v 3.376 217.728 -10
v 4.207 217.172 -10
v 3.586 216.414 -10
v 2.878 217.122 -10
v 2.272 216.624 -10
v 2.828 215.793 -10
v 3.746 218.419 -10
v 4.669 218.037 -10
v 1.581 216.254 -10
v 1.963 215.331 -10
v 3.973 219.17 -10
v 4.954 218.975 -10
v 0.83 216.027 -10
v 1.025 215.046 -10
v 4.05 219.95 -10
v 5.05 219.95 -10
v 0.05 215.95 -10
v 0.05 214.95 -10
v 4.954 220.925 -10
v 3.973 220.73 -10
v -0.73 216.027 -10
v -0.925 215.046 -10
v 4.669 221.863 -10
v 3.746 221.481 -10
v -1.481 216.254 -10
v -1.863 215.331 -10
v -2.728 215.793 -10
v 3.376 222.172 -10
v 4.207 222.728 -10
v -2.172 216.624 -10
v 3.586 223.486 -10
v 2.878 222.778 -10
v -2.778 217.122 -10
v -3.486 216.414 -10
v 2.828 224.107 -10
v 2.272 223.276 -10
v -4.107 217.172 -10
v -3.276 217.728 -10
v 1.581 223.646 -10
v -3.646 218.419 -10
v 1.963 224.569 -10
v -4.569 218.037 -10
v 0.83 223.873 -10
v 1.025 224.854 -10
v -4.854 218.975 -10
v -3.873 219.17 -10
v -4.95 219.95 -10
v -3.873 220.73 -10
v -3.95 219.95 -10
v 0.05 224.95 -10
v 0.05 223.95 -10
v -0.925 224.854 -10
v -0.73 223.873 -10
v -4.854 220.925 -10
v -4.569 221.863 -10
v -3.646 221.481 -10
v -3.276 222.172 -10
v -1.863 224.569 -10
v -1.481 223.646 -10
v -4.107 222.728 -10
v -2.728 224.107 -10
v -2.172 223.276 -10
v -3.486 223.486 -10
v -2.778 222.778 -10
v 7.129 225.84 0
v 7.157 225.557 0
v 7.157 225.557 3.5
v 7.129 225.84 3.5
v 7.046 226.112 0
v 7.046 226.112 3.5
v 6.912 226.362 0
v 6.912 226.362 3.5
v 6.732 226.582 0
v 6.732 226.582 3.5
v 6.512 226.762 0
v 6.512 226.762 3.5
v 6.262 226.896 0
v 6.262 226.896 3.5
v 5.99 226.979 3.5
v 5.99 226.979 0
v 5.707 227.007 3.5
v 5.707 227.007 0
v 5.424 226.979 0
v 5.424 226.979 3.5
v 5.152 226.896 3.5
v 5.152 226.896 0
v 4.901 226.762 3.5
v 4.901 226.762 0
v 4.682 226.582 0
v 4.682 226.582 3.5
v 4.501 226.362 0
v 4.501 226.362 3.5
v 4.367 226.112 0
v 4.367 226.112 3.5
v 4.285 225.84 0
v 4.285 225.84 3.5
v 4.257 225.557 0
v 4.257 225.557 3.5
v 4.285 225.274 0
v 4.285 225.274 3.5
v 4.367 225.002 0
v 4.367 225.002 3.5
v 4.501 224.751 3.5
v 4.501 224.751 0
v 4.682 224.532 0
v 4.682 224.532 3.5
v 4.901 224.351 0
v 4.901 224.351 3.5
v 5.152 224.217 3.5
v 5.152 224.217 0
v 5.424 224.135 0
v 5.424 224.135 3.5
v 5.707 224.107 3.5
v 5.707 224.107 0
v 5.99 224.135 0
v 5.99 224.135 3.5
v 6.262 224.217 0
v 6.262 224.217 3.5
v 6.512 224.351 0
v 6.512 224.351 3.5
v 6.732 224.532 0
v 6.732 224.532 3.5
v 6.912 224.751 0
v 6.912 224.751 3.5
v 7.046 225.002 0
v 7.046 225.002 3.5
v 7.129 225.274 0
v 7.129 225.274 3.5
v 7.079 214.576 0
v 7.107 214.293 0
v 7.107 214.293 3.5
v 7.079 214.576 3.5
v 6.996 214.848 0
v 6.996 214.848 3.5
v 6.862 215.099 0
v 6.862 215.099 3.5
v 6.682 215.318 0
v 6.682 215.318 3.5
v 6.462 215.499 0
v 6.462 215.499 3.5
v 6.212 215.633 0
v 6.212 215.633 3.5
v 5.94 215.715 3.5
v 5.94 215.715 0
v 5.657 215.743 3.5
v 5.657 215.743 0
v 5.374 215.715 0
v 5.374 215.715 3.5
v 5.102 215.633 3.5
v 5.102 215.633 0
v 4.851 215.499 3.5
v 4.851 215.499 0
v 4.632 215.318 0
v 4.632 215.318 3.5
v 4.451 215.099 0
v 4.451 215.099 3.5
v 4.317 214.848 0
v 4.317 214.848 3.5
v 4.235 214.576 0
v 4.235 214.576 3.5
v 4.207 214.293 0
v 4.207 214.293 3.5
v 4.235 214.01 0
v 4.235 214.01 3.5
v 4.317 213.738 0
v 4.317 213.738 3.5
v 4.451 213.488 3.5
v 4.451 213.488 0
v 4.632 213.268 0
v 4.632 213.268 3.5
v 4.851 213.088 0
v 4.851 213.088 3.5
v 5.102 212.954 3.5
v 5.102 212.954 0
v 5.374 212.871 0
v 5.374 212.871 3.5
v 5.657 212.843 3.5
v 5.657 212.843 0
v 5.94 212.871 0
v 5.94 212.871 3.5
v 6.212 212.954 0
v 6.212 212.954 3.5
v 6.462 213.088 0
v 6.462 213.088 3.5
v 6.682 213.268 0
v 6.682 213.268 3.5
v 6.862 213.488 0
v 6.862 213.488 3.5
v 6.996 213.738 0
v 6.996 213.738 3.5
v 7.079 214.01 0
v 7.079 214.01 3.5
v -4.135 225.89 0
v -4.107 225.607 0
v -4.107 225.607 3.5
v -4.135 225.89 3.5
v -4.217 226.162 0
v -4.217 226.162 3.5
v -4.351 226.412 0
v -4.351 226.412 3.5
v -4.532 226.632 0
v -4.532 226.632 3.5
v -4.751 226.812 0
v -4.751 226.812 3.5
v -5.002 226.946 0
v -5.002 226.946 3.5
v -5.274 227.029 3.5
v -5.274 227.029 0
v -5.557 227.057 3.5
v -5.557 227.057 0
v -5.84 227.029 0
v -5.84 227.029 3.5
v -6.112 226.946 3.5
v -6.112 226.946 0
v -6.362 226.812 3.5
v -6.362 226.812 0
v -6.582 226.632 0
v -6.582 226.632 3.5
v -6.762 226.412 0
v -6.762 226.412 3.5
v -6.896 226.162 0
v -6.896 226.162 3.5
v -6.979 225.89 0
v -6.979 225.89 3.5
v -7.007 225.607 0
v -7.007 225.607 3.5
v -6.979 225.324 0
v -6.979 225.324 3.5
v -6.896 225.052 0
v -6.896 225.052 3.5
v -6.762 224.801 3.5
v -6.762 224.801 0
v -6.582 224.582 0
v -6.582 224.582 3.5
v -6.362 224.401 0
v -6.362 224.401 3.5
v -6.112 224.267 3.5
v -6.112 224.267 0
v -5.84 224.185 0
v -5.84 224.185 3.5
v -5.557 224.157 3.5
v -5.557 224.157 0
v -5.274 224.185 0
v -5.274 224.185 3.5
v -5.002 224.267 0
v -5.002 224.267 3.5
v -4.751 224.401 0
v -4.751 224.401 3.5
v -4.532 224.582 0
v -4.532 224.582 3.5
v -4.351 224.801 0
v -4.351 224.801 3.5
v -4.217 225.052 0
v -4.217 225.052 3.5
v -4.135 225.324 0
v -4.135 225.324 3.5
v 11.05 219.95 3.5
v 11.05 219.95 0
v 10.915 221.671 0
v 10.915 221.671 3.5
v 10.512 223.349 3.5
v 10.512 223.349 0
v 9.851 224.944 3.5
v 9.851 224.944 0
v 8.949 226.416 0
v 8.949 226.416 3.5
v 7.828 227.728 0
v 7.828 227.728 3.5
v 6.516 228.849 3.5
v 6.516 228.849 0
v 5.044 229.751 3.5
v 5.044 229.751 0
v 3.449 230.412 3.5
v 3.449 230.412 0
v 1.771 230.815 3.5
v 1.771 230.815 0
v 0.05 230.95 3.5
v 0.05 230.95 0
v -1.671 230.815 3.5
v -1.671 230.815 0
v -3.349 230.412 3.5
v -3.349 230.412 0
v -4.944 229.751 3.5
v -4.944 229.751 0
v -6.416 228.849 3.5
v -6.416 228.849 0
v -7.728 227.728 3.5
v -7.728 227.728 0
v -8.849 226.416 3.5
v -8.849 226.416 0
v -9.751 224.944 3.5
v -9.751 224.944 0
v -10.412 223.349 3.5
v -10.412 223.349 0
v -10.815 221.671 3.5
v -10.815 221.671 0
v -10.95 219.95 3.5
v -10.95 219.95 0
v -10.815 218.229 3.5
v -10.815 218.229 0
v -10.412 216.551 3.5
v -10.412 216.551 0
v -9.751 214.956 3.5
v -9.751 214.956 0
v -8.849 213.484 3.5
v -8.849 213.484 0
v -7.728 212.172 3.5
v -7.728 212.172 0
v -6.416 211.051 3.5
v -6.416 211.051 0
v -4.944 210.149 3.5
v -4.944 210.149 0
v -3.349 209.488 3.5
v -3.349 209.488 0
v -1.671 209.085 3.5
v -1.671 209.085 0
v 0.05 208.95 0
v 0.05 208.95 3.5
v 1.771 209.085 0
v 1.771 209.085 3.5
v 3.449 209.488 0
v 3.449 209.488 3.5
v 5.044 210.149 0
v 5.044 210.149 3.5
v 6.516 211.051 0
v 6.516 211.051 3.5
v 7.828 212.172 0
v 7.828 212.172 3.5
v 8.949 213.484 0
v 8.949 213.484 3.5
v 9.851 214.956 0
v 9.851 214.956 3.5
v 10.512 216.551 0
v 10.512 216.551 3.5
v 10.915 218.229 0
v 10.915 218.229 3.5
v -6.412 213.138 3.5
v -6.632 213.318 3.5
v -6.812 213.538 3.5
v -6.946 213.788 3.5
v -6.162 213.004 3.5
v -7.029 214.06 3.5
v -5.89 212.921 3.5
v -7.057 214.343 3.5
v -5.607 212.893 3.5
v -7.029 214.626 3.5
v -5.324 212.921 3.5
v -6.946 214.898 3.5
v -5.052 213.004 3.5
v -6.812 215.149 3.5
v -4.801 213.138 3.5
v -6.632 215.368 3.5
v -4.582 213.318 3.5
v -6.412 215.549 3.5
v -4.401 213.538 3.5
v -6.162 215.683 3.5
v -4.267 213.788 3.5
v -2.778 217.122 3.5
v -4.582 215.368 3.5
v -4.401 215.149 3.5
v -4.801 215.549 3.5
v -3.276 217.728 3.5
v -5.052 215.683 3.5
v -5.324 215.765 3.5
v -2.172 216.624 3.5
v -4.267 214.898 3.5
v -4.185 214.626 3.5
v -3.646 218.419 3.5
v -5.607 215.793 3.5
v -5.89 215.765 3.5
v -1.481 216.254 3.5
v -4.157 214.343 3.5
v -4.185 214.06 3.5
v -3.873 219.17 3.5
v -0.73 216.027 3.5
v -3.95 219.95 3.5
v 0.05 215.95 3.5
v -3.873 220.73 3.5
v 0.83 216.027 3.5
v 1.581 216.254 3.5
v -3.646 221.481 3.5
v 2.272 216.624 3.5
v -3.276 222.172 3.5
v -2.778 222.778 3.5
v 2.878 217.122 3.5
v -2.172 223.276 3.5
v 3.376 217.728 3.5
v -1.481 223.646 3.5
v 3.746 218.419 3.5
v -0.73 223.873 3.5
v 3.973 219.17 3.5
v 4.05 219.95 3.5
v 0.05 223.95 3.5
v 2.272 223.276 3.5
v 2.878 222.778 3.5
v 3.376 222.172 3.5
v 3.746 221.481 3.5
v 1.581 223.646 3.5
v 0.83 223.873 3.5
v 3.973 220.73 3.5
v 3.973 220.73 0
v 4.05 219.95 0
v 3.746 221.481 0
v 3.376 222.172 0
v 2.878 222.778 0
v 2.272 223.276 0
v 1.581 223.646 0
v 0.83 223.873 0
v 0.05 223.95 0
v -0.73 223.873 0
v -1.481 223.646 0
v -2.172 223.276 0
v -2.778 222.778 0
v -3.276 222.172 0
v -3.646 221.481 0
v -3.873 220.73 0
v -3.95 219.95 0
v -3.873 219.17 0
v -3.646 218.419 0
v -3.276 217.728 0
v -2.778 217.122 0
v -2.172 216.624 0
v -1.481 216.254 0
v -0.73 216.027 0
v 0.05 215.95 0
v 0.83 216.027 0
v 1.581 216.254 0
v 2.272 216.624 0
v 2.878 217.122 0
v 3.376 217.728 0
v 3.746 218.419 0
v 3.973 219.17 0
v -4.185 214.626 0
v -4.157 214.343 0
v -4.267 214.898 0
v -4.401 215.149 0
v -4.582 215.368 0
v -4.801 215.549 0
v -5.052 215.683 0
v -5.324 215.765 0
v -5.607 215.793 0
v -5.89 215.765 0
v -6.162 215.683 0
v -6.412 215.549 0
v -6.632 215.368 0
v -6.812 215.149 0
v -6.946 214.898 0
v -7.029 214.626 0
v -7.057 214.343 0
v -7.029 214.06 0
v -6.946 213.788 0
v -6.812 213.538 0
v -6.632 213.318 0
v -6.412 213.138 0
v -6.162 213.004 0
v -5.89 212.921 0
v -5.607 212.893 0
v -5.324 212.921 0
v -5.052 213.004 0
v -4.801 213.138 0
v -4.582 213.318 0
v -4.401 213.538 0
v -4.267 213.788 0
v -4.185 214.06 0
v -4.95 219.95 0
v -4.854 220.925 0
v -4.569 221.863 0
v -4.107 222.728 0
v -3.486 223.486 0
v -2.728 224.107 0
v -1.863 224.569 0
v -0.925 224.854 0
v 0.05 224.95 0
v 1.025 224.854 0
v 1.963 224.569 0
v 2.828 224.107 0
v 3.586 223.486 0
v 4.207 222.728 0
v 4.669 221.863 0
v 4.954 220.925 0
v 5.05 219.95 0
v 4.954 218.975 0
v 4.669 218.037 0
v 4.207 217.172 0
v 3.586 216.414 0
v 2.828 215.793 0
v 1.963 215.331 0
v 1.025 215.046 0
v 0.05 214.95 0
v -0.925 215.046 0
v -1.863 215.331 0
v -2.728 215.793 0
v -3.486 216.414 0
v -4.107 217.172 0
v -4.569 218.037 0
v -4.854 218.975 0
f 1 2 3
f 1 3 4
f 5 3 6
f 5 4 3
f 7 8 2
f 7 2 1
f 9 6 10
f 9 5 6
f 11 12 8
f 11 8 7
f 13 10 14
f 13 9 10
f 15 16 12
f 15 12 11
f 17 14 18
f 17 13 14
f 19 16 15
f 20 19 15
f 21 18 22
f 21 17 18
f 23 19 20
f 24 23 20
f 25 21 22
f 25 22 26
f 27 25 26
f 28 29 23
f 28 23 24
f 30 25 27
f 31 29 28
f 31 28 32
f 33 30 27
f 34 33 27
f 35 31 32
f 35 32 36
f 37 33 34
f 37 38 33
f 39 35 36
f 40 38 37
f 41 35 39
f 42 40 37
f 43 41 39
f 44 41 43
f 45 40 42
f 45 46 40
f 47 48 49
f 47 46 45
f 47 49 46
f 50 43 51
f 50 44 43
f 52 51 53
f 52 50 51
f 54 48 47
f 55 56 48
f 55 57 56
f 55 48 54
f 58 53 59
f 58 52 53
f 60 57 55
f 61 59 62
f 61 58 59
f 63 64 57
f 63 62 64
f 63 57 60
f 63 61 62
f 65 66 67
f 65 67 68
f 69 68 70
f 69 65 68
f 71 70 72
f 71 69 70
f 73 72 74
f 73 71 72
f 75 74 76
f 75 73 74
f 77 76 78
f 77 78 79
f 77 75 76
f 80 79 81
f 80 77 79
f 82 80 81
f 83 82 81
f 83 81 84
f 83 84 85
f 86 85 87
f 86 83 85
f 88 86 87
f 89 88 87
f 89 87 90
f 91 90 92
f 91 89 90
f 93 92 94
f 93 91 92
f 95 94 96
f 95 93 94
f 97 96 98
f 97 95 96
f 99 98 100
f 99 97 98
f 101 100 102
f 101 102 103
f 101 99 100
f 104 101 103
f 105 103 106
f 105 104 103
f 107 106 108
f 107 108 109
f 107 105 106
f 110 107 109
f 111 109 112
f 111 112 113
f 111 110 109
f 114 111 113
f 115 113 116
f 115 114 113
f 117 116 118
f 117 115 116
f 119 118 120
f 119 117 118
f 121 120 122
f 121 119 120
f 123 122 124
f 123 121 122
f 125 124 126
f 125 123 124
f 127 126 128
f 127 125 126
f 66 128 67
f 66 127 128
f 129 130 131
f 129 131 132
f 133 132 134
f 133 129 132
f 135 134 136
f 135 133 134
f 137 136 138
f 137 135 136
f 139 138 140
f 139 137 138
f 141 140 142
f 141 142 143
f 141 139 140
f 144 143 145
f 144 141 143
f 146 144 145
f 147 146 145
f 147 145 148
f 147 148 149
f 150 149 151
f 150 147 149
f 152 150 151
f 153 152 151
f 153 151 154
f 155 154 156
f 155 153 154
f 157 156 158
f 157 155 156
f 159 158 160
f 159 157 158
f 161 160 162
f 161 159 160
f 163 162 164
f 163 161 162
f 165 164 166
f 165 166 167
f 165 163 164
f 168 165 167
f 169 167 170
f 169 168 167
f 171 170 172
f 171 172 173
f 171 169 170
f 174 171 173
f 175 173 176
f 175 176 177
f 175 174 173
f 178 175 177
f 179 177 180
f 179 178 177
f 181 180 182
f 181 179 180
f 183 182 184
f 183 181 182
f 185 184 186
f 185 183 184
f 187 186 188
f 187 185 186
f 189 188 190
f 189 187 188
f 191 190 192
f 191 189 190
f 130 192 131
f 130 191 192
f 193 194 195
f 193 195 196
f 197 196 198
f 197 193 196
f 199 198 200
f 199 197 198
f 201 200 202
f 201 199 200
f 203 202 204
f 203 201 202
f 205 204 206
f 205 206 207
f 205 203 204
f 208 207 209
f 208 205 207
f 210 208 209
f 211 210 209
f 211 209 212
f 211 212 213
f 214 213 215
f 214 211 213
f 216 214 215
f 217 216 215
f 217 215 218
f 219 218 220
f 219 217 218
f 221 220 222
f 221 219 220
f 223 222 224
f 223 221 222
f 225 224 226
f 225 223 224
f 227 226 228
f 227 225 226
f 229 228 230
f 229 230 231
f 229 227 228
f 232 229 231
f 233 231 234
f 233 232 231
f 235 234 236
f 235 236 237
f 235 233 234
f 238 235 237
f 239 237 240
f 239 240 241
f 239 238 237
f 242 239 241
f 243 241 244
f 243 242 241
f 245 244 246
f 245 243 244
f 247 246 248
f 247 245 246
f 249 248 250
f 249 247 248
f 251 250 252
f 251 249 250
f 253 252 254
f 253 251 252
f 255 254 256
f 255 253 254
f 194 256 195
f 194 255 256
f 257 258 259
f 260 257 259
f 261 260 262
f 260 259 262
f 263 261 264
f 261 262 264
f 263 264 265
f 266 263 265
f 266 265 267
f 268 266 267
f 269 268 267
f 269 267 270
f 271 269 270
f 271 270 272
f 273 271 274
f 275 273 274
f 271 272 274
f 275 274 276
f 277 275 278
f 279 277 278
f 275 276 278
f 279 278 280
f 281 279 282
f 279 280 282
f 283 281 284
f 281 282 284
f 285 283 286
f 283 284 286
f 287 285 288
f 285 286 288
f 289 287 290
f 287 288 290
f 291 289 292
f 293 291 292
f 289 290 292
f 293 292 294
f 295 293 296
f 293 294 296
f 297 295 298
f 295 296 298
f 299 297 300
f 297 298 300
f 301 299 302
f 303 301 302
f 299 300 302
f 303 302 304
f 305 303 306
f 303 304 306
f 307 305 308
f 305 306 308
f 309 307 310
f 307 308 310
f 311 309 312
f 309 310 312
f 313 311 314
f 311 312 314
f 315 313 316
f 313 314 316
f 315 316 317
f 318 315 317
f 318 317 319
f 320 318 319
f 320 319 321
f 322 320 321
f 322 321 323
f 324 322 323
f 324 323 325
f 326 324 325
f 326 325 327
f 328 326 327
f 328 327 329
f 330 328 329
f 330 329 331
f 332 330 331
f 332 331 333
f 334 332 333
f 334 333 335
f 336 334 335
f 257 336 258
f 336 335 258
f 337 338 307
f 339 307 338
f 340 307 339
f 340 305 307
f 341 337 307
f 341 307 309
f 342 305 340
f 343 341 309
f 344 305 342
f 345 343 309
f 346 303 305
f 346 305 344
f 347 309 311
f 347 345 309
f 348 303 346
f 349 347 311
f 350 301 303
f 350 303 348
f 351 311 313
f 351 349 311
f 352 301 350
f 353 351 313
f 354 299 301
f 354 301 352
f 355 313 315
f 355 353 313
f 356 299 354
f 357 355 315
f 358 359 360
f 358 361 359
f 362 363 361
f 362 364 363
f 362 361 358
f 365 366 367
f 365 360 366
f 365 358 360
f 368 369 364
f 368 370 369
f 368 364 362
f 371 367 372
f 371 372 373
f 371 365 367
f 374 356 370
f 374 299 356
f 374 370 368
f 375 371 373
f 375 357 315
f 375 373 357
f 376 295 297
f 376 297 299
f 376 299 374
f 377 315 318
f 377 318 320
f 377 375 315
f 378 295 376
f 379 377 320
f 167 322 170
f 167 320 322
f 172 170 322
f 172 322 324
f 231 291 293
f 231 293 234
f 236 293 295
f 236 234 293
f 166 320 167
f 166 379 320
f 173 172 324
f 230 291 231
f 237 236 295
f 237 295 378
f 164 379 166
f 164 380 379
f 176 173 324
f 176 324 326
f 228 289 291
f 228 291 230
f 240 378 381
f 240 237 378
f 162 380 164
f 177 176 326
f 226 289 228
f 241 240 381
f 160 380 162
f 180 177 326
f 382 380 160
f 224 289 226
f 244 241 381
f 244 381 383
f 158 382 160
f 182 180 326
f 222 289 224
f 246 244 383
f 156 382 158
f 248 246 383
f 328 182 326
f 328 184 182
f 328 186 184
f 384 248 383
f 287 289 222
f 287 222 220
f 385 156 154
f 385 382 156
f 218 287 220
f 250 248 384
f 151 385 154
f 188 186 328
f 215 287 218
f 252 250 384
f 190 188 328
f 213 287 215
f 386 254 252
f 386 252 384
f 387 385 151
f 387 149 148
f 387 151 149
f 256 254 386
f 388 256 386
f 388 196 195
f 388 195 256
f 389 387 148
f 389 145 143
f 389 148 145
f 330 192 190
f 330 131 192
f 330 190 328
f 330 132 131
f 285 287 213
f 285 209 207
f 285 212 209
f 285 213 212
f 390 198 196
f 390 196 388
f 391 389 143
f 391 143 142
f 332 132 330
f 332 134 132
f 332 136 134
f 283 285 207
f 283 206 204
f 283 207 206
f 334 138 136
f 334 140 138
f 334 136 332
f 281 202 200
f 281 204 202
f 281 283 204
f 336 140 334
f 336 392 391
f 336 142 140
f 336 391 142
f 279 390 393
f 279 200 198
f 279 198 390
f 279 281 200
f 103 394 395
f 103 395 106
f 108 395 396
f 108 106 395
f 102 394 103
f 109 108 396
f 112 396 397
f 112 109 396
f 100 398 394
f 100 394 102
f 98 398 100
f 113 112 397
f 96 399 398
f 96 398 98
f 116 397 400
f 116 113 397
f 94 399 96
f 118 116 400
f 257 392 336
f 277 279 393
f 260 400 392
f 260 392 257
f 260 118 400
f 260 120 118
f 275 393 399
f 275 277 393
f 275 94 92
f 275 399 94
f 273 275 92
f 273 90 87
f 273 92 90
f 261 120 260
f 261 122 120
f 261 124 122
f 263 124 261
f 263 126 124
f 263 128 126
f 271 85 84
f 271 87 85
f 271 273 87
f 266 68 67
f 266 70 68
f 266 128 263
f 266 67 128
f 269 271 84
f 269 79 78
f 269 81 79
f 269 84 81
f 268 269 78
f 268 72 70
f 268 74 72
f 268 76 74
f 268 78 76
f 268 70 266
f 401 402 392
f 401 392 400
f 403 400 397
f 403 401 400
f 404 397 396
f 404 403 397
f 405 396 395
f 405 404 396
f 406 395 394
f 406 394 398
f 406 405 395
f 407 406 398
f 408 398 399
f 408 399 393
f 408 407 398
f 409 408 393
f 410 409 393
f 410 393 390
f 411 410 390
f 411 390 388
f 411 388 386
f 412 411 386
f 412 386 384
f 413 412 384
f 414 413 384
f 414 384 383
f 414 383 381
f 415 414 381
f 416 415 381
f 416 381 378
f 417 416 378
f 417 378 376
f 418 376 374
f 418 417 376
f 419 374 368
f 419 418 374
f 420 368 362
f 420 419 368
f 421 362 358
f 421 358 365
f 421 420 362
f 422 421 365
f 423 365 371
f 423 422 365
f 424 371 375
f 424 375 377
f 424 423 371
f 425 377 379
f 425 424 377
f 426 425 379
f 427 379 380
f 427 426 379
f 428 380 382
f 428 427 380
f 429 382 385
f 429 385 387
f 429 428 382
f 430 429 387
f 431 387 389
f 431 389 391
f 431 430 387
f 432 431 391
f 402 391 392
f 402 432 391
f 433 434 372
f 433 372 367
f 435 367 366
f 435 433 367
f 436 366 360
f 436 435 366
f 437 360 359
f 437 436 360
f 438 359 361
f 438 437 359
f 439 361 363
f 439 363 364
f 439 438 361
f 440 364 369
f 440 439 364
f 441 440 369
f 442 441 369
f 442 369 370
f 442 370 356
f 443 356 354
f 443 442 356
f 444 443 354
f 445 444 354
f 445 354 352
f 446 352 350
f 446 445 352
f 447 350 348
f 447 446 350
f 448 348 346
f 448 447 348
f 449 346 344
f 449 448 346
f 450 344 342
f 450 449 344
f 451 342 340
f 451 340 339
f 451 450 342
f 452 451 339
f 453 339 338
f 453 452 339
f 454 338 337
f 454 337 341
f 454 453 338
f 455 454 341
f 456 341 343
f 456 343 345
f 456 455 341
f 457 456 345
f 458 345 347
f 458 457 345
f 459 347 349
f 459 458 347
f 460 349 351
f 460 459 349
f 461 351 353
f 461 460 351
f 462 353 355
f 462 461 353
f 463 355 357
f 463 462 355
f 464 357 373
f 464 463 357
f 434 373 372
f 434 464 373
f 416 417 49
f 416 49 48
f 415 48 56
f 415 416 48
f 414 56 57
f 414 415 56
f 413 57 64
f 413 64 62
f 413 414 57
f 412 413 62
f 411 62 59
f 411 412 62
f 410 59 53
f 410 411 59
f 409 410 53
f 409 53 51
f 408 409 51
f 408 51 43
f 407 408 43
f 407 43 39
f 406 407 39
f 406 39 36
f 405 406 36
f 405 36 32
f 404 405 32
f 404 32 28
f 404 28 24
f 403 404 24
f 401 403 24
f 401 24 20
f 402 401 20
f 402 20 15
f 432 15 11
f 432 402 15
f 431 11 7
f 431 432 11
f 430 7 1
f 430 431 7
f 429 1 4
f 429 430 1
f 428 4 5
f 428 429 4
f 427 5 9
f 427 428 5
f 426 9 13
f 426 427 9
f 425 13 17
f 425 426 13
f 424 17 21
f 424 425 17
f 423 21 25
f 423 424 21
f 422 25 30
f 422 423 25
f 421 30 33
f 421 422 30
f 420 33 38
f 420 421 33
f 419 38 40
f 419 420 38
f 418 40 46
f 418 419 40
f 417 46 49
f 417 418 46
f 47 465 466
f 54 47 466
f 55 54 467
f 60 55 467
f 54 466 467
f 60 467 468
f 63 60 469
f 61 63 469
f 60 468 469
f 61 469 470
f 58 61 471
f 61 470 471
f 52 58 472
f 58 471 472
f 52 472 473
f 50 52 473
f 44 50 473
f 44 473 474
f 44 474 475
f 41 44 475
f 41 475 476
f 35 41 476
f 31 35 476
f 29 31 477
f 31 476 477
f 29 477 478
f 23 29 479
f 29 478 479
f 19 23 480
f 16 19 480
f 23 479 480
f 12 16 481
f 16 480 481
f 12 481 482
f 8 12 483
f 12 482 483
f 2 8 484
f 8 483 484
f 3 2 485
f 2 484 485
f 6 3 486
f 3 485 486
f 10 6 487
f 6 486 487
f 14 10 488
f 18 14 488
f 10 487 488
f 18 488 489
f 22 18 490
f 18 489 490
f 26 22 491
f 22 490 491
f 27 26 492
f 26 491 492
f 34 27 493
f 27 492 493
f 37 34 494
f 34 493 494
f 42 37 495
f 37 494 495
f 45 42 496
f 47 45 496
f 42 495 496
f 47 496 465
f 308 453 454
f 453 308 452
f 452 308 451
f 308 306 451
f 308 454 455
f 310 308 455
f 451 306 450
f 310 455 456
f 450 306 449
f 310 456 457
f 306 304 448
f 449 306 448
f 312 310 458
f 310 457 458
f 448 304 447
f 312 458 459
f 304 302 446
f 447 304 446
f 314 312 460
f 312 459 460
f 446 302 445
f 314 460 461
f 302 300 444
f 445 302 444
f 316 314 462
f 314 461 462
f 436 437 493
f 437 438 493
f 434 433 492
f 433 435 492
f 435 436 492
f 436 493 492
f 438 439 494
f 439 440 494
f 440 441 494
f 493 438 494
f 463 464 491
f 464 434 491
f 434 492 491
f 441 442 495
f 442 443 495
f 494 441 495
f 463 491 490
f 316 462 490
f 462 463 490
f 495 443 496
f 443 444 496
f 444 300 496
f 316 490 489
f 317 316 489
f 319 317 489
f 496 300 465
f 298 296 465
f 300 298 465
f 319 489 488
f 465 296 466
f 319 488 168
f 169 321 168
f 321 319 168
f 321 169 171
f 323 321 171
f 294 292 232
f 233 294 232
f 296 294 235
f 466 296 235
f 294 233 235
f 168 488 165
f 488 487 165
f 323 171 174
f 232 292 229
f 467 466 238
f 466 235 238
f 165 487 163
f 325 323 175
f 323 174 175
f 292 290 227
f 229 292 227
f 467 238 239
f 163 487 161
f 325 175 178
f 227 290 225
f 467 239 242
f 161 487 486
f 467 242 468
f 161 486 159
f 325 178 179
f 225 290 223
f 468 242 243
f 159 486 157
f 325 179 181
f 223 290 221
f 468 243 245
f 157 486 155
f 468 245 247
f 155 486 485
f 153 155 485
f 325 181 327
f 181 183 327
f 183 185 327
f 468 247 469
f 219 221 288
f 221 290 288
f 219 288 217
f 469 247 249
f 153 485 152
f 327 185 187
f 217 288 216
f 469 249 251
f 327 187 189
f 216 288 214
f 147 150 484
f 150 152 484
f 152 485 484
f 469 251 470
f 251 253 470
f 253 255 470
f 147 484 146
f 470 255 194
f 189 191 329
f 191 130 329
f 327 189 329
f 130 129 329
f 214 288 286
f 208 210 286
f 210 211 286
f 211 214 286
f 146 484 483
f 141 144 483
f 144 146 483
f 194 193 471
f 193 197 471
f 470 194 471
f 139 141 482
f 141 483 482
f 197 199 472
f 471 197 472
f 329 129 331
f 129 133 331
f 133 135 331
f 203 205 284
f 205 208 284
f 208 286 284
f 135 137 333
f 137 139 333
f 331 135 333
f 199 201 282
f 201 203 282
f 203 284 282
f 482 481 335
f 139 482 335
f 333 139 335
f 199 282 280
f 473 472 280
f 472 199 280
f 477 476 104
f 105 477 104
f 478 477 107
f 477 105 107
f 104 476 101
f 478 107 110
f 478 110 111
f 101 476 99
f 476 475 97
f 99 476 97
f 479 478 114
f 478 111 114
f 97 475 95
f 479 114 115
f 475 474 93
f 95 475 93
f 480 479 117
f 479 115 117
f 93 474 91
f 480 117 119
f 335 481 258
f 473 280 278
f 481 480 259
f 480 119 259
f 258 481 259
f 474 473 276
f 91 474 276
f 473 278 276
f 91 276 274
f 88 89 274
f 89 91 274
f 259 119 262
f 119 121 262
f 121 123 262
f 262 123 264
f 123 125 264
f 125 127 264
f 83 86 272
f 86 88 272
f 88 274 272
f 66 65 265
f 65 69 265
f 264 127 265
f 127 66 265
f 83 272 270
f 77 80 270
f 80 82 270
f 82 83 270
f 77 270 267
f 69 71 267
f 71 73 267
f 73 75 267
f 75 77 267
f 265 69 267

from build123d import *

# Parameters (mm, degrees)
SKETCH1_R           = 11
SKETCH1_R_2         = 4
SKETCH1_R_3         = 1.45
BOSS_EXTRUDE1_DEPTH = 3.5
SKETCH2_R           = 5
SKETCH2_R_2         = 4
BOSS_EXTRUDE2_DEPTH = 10


with BuildPart() as part:
    # Sketch1 → Boss-Extrude1 (new body)
    with BuildSketch(Plane.XY):
        with Locations((0.049999962, 219.95)):
            Circle(SKETCH1_R)
        with Locations((0.049999962, 219.95)):
            Circle(SKETCH1_R_2, mode=Mode.SUBTRACT)
        with Locations((5.656854228, 214.293145824)):
            Circle(SKETCH1_R_3, mode=Mode.SUBTRACT)
        with Locations((-5.606854214, 214.343145734)):
            Circle(SKETCH1_R_3, mode=Mode.SUBTRACT)
        with Locations((-5.556854304, 225.606854176)):
            Circle(SKETCH1_R_3, mode=Mode.SUBTRACT)
        with Locations((5.706854138, 225.556854266)):
            Circle(SKETCH1_R_3, mode=Mode.SUBTRACT)
    extrude(amount=BOSS_EXTRUDE1_DEPTH)

    # Sketch2 → Boss-Extrude2 (add)
    with BuildSketch(Plane(origin=(0, 0, 0), x_dir=(-1, 0, 0), z_dir=(0, 0, -1))):
        with Locations((-0.049999962, 219.95)):
            Circle(SKETCH2_R)
        with Locations((-0.049999962, 219.95)):
            Circle(SKETCH2_R_2, mode=Mode.SUBTRACT)
    extrude(amount=BOSS_EXTRUDE2_DEPTH)


solid = part.part
